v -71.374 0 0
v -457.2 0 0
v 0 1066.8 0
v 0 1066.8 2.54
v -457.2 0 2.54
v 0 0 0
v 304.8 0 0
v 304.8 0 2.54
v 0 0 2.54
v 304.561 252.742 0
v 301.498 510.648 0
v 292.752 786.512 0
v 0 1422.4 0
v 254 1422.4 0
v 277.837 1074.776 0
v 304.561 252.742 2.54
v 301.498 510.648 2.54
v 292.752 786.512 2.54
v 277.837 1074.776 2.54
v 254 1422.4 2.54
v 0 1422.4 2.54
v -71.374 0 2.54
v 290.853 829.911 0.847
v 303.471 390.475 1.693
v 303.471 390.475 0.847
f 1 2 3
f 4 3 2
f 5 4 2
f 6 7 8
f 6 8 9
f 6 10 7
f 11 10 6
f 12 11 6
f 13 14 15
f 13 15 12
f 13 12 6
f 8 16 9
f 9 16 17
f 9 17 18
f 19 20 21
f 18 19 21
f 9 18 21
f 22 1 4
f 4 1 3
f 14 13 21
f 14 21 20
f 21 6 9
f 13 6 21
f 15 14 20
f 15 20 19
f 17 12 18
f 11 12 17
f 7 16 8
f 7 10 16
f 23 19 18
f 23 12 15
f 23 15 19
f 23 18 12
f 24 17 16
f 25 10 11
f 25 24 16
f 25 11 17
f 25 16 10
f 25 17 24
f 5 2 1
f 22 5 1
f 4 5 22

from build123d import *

# Parameters (mm, degrees)
BOSS_EXTRUDE1_DEPTH = 2.54
BOSS_EXTRUDE3_DEPTH = 2.54


with BuildPart() as part:
    # Sketch1 → Boss-Extrude1 (new body)
    with BuildSketch(Plane.XY):
        with BuildLine():
            Line((0, 0), (0, 1422.4))
            Line((0, 1422.4), (254, 1422.4))
            add(Edge.make_bspline(
                [(254, 1422.4), (307.286819, 718.686132178), (304.8, 400.693352615), (304.8, 0)],
                knots=[0, 0, 0, 0, 1, 1, 1, 1], degree=3))
            Line((304.8, 0), (0, 0))
        make_face()
    extrude(amount=BOSS_EXTRUDE1_DEPTH)


with BuildPart() as body_2:
    # Sketch2 → Boss-Extrude3 (new body)
    with BuildSketch(Plane.XY):
        Polygon((-71.373524572, 0), (0, 1066.8), (-457.2, 0), align=None)
    extrude(amount=BOSS_EXTRUDE3_DEPTH)


solid = Compound([part.part, body_2.part])
